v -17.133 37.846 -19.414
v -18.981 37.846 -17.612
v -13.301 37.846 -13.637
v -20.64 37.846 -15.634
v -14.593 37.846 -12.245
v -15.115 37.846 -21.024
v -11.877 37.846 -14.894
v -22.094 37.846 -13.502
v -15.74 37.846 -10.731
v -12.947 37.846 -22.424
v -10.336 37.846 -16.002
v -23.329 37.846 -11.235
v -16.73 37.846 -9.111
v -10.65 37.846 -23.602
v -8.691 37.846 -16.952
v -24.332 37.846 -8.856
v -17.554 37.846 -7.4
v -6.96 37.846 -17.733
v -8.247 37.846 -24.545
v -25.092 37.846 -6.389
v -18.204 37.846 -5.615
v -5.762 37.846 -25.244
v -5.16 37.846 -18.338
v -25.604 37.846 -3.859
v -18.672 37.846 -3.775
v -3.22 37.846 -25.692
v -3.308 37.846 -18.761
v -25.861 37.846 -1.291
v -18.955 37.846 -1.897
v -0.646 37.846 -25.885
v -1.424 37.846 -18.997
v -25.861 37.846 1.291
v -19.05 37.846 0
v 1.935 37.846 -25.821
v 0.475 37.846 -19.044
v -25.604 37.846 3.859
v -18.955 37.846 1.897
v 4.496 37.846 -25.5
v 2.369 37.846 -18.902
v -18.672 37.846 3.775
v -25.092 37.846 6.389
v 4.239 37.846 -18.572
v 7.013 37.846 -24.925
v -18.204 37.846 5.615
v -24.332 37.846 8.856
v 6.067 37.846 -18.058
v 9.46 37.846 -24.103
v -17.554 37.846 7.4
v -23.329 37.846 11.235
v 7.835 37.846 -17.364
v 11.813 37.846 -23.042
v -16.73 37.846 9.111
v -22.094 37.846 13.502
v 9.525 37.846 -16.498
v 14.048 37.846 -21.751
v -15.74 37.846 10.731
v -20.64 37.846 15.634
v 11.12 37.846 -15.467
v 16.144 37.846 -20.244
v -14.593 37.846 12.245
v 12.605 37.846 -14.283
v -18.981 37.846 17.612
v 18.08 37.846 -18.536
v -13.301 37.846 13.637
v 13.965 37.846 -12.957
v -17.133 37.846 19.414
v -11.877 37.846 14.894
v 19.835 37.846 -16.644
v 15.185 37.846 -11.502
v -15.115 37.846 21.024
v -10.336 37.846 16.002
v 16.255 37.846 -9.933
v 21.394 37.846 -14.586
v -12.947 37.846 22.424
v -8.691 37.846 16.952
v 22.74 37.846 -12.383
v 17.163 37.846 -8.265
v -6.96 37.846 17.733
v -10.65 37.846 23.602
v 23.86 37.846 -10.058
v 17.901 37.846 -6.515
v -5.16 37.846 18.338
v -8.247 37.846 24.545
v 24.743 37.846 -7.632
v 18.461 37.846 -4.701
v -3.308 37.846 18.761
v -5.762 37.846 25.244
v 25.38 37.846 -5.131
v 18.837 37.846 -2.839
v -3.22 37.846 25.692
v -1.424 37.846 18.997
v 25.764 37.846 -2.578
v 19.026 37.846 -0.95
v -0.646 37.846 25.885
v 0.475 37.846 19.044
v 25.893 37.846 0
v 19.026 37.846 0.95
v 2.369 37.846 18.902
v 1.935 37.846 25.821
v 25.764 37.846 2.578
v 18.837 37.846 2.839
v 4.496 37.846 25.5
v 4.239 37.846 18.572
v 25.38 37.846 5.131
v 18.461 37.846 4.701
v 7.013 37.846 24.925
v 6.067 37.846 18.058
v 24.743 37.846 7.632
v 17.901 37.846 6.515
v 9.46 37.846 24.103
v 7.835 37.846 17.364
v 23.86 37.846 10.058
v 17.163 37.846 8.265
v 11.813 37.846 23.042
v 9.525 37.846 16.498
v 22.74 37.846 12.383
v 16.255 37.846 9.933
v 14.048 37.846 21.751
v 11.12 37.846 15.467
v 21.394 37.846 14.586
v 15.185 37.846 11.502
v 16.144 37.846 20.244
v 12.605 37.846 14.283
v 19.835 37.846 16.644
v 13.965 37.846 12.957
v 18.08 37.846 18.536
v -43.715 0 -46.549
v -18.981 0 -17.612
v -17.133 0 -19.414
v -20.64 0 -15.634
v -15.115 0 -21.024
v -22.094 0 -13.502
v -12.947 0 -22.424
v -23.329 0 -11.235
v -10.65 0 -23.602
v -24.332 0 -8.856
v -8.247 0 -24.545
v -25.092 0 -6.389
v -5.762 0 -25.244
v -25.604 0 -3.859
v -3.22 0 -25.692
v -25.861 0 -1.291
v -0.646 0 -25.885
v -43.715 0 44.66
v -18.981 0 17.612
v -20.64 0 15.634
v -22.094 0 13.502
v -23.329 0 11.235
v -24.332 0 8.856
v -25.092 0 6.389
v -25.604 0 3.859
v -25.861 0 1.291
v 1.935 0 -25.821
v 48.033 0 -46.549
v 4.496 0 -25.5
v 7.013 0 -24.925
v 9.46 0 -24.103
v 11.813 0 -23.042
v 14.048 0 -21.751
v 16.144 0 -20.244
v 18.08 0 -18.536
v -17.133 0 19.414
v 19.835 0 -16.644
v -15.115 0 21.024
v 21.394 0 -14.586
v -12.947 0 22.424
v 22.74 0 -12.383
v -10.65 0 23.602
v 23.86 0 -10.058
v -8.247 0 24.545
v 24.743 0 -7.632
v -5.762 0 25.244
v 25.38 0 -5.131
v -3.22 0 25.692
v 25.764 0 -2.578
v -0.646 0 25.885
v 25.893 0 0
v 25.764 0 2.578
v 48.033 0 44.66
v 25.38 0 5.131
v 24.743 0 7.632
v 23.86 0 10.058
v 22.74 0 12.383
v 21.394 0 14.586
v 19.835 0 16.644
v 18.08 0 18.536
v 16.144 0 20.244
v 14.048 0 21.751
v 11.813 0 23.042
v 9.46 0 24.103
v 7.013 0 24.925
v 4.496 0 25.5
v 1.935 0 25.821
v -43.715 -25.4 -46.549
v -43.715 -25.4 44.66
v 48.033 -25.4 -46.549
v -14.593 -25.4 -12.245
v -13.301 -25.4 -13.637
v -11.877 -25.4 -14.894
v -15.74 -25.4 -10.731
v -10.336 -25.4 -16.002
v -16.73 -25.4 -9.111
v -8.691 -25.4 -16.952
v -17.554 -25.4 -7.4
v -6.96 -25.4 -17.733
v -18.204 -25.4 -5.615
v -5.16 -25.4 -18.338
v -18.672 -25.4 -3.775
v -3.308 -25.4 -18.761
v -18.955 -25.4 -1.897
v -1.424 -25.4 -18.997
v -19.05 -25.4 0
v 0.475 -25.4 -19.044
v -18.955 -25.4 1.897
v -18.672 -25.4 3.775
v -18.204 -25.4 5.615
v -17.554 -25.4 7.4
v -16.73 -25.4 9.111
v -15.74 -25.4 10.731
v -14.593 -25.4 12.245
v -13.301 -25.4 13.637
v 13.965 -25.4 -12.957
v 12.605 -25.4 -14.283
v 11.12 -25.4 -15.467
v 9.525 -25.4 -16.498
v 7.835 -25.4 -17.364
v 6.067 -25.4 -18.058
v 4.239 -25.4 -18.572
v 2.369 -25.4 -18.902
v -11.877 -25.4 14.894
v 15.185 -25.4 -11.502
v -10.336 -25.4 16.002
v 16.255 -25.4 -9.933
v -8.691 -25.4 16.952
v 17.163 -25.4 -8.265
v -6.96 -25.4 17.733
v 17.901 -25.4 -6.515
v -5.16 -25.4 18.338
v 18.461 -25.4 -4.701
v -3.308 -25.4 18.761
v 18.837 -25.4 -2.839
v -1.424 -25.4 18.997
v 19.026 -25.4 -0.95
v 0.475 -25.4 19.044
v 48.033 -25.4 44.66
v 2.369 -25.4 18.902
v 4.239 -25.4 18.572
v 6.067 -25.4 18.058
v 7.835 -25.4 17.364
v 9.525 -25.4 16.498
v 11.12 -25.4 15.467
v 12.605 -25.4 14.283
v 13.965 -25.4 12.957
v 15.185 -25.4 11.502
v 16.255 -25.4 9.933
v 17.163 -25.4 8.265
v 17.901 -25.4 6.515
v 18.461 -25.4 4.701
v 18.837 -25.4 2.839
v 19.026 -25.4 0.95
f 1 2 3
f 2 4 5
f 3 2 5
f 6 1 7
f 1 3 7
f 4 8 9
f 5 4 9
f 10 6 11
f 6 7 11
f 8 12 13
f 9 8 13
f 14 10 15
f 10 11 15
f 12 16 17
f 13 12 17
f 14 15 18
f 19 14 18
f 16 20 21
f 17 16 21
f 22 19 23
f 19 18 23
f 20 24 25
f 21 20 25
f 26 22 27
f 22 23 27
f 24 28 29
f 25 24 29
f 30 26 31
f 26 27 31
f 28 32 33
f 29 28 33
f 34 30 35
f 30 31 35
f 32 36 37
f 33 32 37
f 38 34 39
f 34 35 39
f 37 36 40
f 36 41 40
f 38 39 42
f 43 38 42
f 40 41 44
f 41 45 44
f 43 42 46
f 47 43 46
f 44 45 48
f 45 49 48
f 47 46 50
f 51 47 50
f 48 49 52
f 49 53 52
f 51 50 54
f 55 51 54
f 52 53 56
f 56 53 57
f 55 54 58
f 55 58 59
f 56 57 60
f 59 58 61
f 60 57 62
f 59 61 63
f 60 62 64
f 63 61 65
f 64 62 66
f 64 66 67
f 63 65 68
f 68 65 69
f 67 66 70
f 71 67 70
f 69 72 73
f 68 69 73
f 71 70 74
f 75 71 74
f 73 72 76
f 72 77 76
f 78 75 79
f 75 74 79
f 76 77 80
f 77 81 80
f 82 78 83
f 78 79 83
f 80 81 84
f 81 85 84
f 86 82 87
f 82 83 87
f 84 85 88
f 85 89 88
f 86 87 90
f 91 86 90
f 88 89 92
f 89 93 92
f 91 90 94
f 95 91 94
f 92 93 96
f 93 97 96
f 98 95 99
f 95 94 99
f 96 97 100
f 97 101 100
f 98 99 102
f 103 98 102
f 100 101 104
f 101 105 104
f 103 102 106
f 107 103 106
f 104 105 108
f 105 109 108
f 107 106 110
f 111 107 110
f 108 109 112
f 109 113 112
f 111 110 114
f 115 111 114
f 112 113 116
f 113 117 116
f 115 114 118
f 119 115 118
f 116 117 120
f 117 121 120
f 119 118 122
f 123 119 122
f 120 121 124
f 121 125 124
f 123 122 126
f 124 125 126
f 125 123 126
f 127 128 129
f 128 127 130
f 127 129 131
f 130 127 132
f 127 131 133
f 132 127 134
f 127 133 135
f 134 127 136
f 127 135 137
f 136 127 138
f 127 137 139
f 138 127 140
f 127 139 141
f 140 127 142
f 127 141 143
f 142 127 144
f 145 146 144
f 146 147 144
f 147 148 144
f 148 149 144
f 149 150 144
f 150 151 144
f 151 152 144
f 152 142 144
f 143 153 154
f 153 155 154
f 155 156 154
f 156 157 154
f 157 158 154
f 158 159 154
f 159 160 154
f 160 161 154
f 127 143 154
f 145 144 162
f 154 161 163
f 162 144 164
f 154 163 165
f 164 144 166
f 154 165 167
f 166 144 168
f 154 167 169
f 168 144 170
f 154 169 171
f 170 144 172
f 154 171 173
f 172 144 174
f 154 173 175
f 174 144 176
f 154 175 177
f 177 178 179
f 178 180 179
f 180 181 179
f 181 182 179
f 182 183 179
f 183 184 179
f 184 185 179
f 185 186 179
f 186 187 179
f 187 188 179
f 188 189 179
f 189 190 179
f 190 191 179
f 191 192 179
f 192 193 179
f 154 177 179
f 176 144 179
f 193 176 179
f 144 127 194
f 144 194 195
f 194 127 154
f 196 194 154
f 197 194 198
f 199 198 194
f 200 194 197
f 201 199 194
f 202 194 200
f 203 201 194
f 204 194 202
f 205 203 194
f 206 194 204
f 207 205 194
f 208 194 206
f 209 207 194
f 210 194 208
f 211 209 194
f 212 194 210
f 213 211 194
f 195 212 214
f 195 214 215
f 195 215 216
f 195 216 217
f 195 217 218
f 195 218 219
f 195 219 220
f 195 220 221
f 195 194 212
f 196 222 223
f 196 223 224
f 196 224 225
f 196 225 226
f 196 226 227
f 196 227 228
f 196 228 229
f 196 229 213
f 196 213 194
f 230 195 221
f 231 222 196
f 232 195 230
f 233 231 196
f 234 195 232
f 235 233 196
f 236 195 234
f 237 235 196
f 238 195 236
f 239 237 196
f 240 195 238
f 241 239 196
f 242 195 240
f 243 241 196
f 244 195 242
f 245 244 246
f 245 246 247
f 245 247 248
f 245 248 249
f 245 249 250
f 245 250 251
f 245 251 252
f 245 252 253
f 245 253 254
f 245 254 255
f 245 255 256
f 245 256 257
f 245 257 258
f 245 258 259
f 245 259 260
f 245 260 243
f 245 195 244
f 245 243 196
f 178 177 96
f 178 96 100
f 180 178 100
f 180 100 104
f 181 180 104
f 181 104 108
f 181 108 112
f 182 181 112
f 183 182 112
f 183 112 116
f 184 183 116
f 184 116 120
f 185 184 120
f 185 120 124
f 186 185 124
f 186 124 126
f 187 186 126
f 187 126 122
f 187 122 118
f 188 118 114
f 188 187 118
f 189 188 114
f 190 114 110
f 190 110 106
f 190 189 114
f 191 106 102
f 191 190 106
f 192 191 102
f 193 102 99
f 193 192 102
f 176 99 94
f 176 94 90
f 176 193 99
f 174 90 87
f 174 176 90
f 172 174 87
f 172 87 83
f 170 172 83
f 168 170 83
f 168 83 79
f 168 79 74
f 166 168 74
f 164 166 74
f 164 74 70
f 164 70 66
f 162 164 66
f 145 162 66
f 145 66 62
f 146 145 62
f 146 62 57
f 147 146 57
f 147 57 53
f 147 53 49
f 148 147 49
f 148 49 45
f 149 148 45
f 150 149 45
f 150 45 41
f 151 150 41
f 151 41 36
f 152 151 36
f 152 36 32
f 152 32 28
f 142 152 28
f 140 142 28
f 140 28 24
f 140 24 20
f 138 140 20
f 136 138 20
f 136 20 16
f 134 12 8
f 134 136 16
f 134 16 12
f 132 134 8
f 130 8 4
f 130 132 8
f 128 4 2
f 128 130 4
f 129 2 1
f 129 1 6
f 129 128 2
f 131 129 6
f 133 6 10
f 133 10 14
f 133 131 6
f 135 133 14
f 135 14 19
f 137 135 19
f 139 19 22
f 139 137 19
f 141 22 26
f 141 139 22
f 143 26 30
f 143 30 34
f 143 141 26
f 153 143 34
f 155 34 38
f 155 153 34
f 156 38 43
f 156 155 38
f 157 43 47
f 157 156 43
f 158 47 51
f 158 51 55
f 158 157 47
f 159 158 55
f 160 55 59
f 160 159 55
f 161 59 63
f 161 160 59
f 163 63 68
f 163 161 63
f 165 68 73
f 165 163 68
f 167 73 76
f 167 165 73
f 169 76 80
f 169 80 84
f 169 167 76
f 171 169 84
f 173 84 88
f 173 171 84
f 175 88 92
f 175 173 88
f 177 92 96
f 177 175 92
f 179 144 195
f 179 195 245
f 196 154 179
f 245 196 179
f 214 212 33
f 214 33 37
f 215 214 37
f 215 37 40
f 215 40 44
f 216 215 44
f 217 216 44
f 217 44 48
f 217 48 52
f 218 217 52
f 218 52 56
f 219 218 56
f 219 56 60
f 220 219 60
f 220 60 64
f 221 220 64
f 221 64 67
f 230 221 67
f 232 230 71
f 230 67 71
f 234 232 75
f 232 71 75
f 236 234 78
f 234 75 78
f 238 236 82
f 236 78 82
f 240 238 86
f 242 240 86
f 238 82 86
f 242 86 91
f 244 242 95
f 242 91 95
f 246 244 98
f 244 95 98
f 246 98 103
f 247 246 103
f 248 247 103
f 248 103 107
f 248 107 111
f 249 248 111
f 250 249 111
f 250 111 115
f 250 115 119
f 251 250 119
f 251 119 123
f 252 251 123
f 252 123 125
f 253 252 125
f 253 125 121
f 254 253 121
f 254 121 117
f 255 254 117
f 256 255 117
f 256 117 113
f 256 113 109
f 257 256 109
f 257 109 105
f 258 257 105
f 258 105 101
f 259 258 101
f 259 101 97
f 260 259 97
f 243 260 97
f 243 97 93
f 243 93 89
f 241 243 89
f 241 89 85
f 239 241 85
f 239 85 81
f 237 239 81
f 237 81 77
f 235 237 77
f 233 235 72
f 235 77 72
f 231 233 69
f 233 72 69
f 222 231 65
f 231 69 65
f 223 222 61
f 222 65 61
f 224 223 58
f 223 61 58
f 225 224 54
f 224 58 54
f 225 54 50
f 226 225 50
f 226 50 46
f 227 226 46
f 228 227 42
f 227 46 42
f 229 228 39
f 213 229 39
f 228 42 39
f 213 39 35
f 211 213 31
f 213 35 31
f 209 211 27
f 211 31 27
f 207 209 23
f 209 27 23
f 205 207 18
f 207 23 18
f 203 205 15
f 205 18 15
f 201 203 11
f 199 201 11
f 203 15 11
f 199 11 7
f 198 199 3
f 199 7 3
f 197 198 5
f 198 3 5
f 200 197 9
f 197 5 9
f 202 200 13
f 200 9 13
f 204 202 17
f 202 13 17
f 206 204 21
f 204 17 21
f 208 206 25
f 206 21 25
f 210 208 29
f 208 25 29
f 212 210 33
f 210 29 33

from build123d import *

# Parameters (mm, degrees)
F0_W     = 91.748398
F0_H     = 91.2087
F1_DEPTH = 25.4
F4_D     = 50.8
F2_R     = 25.893128
F6_DEPTH = 63.246
F7_D     = 38.1


with BuildPart() as f1:
    # F0 (on Front) → F1 (new body)
    with BuildSketch(Plane.XZ):
        with Locations((2.158785, -0.944471)):
            Rectangle(F0_W, F0_H)
    extrude(amount=F1_DEPTH)

    # F4 (through all)
    with Locations(Plane.XZ.offset(25.4)):
        with Locations((0, 0)):
            Hole(F4_D / 2)

    # F2 (on face) → F6 (join)
    with BuildSketch(Plane.XZ.offset(25.4)):
        Circle(F2_R)
    extrude(amount=-F6_DEPTH)

    # F7 (through all)
    with Locations(Plane.XZ.offset(25.4)):
        with Locations((0, 0)):
            Hole(F7_D / 2)


solid = f1.part
